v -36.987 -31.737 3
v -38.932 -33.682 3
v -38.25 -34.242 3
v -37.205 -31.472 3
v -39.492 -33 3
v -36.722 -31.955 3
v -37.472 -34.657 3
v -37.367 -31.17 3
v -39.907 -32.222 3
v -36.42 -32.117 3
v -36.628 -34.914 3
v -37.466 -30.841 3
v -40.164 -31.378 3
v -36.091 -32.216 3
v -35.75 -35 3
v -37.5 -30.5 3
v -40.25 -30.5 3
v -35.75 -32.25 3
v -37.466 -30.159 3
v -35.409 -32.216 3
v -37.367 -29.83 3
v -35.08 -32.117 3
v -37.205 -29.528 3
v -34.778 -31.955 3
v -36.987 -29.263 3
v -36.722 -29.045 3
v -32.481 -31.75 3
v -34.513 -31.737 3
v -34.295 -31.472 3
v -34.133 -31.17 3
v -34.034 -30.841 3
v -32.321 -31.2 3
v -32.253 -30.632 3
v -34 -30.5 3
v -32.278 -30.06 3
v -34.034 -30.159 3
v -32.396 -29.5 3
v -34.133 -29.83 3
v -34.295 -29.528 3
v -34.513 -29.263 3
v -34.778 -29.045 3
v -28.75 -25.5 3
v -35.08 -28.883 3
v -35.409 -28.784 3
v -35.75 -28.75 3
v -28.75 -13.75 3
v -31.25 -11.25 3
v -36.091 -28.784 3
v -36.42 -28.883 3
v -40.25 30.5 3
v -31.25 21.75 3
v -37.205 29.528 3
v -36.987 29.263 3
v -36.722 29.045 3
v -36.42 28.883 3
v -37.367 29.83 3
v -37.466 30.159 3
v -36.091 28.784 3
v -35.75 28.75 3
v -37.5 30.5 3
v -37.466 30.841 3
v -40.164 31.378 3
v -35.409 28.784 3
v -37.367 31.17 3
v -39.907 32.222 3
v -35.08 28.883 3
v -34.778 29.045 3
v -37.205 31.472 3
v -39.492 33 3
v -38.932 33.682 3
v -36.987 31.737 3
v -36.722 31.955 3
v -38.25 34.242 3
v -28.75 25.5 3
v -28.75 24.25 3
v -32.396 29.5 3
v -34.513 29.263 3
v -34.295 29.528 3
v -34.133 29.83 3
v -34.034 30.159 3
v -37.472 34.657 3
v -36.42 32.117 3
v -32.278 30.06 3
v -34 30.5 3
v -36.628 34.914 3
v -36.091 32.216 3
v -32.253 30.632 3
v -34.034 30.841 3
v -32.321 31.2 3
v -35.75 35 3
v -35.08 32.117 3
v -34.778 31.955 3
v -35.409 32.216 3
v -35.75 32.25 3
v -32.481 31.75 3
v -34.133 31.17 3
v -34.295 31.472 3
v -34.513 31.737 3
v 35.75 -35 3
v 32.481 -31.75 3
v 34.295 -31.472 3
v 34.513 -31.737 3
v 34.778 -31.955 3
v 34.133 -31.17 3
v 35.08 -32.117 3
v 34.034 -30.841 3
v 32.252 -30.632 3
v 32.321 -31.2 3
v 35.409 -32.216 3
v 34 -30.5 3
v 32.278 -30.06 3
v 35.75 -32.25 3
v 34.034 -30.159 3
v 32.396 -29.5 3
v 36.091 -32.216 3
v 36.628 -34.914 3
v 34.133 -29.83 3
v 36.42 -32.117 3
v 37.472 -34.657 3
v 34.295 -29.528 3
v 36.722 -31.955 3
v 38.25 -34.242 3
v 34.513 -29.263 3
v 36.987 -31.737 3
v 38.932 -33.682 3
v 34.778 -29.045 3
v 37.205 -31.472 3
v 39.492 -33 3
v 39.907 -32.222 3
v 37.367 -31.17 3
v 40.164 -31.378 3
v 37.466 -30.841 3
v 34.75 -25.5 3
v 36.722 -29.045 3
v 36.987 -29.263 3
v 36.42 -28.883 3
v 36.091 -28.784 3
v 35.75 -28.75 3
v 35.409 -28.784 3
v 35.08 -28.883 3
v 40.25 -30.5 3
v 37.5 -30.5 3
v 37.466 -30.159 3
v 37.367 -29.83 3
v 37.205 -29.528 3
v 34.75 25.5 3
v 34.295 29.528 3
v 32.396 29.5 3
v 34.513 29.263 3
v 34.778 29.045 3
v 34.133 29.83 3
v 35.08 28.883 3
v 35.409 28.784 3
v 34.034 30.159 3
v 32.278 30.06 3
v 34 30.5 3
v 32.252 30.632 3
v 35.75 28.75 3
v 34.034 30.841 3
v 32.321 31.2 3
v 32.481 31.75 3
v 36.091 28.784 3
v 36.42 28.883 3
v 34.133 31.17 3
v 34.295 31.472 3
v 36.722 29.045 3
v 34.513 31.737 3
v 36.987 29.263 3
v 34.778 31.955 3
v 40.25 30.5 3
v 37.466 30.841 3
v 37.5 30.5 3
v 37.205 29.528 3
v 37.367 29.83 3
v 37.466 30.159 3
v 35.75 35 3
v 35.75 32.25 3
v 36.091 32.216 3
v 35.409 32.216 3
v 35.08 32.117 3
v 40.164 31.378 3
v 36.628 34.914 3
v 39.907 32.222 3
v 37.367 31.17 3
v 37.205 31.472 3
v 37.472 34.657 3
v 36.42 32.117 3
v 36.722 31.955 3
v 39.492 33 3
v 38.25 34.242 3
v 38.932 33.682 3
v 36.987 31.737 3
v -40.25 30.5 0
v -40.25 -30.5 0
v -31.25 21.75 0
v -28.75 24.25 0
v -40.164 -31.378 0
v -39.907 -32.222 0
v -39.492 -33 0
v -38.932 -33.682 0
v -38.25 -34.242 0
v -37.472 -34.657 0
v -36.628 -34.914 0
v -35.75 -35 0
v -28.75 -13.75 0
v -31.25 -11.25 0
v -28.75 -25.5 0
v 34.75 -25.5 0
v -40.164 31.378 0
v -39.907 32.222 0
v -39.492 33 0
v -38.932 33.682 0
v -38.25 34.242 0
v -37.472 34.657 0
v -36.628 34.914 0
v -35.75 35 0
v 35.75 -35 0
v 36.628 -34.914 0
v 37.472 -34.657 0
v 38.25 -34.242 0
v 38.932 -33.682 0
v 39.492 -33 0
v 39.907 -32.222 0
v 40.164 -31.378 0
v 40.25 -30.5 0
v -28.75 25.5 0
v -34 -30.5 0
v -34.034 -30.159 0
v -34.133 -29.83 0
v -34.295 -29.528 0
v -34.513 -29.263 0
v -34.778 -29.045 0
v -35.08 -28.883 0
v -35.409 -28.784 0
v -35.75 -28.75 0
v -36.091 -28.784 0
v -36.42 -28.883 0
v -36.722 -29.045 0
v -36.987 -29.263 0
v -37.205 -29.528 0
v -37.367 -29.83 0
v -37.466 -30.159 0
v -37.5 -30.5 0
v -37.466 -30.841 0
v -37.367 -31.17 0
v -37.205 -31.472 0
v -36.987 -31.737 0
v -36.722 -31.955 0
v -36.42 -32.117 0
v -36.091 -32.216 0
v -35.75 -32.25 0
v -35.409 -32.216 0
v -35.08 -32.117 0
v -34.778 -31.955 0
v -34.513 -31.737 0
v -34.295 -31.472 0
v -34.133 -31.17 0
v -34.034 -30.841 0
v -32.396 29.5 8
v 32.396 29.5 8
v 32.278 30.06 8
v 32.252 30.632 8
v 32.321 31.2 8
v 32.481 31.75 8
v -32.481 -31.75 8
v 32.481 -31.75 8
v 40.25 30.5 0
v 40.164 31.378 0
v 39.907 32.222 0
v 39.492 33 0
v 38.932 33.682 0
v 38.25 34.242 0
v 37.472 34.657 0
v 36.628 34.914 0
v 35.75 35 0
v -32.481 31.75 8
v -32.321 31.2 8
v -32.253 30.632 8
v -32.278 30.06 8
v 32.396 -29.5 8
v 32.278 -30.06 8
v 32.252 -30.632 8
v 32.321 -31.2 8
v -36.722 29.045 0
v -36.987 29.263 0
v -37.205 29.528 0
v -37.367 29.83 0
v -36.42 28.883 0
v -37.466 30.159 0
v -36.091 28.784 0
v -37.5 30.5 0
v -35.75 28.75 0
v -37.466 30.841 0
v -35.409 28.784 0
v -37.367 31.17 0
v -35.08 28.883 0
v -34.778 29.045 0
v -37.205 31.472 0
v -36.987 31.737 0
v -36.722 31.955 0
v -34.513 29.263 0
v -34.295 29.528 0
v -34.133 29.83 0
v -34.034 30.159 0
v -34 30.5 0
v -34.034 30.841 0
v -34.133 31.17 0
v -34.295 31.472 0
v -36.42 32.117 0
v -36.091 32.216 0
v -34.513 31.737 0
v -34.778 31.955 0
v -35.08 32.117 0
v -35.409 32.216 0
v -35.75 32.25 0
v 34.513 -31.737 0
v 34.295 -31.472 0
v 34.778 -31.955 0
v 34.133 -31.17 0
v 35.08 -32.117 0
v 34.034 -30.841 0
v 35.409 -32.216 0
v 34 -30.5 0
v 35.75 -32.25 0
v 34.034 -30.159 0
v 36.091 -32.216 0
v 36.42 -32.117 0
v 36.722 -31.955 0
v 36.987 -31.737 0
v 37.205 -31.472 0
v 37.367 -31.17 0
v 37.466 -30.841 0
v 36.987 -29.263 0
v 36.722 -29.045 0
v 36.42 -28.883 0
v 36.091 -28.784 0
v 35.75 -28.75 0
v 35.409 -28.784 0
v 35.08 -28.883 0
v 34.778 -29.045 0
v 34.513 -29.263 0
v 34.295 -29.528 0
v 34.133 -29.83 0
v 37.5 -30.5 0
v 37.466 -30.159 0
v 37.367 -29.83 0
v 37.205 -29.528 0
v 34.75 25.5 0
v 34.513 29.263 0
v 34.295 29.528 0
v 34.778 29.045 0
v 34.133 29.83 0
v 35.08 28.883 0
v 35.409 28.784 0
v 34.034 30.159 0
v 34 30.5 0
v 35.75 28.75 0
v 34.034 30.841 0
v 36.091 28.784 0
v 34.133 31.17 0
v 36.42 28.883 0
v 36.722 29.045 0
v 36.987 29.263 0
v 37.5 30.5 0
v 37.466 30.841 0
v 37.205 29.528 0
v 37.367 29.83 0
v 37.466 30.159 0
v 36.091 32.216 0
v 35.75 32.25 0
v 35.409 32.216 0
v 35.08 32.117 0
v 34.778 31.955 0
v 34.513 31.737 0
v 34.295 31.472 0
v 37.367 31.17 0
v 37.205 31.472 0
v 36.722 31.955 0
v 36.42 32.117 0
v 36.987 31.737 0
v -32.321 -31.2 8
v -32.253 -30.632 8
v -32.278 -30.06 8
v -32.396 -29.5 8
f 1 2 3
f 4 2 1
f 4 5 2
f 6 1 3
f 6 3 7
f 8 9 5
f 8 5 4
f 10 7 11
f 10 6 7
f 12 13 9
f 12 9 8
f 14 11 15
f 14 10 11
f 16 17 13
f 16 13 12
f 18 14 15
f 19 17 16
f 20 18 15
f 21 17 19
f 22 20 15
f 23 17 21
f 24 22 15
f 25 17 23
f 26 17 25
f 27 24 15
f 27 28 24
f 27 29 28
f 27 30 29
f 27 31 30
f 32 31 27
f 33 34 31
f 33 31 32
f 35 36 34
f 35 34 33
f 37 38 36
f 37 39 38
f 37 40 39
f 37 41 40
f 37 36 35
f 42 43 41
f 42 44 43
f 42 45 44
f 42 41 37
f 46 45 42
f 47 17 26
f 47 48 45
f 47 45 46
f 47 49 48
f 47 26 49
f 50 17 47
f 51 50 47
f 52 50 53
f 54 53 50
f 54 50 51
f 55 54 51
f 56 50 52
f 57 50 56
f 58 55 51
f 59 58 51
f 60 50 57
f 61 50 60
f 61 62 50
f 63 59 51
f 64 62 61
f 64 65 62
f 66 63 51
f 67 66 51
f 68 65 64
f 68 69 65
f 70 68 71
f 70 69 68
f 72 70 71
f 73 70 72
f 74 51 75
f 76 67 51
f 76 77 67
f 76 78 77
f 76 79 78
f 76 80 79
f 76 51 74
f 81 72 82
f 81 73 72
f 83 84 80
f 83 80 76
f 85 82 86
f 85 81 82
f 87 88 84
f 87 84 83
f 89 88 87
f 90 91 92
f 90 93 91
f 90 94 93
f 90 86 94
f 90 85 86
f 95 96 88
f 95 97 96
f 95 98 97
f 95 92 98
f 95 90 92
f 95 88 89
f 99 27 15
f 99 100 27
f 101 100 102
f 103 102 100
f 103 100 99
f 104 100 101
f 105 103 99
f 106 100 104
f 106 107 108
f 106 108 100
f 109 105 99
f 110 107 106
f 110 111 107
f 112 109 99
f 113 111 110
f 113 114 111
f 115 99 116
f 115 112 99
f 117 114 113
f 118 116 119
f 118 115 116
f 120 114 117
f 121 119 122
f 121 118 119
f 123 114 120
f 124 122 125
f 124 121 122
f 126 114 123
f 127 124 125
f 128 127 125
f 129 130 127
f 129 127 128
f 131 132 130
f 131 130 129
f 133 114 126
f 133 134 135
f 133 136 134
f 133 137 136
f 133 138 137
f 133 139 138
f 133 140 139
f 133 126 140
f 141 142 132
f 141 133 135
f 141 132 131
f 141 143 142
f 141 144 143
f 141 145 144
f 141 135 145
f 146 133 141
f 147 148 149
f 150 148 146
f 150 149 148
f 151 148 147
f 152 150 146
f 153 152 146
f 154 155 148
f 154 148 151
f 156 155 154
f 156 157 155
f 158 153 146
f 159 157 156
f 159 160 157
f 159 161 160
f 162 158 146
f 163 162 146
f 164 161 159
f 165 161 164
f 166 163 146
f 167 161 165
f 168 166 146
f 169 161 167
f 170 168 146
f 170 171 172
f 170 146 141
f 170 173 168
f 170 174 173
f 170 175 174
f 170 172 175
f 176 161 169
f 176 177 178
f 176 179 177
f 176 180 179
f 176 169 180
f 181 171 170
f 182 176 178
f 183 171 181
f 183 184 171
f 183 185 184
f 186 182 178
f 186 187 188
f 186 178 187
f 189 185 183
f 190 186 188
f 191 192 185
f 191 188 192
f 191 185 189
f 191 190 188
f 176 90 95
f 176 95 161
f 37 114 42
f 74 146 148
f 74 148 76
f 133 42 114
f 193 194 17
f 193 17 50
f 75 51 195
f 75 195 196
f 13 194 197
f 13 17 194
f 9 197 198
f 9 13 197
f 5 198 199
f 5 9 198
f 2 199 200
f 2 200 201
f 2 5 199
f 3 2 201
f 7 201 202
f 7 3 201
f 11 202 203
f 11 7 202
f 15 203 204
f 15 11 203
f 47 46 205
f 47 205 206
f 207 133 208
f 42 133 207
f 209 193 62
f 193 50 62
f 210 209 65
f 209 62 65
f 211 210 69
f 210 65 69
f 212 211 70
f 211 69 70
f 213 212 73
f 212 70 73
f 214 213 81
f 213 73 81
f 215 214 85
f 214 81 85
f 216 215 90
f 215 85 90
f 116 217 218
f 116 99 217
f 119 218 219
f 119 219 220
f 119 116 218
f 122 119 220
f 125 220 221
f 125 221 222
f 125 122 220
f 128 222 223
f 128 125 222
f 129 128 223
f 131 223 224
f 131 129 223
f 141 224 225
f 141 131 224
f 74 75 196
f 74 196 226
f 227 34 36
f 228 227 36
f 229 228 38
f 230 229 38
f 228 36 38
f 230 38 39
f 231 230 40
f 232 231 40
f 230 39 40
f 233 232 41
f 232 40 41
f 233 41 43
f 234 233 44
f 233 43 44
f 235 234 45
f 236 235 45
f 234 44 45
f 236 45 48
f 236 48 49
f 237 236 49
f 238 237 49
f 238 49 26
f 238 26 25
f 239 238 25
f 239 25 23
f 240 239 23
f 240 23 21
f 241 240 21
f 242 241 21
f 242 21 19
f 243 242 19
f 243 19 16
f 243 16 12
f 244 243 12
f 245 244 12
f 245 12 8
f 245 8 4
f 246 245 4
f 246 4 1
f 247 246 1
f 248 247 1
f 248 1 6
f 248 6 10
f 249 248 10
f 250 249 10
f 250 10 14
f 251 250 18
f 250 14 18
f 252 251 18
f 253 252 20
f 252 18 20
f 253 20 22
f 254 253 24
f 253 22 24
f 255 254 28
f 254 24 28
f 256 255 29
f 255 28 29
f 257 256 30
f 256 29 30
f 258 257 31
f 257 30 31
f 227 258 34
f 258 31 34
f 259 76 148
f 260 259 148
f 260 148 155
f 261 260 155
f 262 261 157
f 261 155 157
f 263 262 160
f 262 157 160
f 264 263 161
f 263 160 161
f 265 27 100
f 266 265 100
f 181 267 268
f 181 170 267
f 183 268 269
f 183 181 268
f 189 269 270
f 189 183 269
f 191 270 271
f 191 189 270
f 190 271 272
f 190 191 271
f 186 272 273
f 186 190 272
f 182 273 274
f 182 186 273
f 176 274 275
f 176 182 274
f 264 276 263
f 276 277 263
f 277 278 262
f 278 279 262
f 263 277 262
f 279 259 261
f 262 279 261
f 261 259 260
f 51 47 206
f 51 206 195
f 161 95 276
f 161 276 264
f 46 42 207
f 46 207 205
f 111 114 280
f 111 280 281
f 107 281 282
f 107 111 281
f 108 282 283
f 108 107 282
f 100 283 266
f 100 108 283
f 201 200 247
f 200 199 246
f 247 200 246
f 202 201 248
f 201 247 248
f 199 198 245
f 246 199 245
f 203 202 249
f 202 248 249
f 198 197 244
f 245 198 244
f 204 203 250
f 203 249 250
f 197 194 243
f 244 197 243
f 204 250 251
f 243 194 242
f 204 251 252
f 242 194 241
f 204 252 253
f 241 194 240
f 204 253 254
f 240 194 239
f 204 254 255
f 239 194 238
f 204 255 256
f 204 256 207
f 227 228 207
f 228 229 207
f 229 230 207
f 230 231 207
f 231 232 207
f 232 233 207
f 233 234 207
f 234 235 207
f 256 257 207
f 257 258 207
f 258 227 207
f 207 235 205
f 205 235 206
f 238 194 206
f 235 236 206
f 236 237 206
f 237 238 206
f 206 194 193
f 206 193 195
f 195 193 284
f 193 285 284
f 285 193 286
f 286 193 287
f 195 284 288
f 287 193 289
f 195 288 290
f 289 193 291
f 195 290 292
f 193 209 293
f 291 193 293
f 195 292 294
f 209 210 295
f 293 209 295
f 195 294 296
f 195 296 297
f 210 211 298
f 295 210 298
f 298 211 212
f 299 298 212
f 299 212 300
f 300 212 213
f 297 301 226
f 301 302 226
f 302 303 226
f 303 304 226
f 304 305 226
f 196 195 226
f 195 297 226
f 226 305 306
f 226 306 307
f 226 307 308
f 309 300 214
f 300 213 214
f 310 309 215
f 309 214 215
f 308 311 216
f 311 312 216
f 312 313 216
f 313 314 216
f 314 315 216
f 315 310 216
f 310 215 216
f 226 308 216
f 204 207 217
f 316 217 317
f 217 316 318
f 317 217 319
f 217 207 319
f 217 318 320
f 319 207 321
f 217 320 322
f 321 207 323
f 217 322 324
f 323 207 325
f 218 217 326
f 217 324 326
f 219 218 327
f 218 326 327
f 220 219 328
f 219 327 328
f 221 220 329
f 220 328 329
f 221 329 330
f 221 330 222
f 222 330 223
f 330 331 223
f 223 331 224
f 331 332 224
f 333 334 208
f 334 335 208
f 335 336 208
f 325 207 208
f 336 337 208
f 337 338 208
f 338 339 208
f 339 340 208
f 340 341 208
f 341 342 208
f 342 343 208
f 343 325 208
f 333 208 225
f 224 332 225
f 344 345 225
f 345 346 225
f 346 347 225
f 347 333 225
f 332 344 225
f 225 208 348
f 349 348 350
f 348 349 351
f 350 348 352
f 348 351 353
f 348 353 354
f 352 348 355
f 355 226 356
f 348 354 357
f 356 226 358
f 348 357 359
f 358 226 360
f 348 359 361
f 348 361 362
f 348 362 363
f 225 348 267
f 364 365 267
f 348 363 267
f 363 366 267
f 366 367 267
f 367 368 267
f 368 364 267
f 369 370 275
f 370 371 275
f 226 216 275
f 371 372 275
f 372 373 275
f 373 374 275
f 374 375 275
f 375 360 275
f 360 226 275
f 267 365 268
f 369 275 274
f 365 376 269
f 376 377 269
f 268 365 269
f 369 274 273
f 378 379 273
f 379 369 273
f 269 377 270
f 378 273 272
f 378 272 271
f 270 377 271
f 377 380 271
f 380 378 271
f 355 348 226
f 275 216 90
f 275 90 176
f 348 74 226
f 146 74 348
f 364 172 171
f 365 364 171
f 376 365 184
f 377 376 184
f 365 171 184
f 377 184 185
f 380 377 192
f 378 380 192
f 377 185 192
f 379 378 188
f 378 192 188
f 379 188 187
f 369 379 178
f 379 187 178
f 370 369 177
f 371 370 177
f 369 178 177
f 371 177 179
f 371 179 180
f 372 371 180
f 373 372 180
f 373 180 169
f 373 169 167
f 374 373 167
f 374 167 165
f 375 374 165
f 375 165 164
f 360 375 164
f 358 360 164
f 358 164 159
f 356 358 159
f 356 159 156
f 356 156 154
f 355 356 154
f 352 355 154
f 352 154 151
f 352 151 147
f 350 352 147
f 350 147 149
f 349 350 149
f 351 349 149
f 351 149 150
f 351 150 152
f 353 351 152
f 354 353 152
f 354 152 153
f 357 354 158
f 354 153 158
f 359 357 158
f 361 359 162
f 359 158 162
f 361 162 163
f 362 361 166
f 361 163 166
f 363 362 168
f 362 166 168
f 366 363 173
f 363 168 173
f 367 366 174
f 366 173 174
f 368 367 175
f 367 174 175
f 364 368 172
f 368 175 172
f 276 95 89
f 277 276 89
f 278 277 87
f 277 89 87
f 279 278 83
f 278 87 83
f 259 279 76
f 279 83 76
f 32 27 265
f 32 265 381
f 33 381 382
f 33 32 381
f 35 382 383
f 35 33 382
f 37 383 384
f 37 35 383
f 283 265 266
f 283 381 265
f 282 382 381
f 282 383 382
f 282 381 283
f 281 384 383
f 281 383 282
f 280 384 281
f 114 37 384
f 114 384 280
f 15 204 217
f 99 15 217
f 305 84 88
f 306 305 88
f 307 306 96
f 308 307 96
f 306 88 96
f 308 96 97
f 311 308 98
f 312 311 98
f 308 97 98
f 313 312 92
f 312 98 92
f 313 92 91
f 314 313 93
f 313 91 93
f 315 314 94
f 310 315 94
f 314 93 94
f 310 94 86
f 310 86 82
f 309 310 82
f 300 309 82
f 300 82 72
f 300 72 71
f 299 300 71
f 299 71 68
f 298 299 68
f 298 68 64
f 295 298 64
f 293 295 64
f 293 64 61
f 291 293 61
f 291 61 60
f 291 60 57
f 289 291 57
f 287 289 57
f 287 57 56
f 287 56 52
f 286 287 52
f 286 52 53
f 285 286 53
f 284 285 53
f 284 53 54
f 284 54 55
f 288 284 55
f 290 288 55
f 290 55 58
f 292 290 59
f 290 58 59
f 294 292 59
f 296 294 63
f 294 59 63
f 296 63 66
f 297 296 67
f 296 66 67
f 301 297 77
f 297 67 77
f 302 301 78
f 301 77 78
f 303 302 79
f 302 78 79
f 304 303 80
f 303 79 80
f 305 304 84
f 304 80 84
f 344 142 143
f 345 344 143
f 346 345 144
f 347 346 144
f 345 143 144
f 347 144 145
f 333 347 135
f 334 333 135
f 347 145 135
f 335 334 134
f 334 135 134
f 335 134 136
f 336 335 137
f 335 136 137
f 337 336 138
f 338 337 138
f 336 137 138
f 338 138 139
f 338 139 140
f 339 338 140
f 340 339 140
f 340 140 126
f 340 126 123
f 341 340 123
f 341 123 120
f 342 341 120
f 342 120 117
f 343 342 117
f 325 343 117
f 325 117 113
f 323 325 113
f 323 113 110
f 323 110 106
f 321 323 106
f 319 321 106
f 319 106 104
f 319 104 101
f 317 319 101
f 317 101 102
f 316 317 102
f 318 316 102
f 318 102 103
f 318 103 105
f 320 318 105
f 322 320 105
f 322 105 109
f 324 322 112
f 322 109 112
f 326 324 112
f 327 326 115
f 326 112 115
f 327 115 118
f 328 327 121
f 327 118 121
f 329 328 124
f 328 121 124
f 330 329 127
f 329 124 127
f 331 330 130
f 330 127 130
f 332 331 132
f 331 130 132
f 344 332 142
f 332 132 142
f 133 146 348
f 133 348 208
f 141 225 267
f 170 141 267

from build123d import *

# Parameters (mm, degrees)
SKETCH_W        = 80.5
SKETCH_H        = 70
PAD_DEPTH       = 3
FILLET_R        = 4.5
SKETCH001_R     = 1.75
POCKET_DEPTH    = 3.001
PAD001_DEPTH    = 5
POCKET001_DEPTH = 3.001


with BuildPart() as part:
    # Sketch → Pad (new body)
    with BuildSketch(Plane.XY):
        Rectangle(SKETCH_W, SKETCH_H)
    extrude(amount=PAD_DEPTH)

    # Fillet
    fillet_edges = [part.edges().sort_by_distance(p)[0] for p in [
        (-40.25, -35, 1.5),
        (40.25, -35, 1.5),
        (40.25, 35, 1.5),
        (-40.25, 35, 1.5),
    ]]
    fillet(fillet_edges, radius=FILLET_R)

    # Sketch001 (on Face5 of Fillet) → Pocket (cut, through all)
    with BuildSketch(Plane.XY.offset(3)):
        with Locations((-35.75, 30.5)):
            Circle(SKETCH001_R)
        with Locations((35.75, 30.5)):
            Circle(SKETCH001_R)
        with Locations((-35.75, -30.5)):
            Circle(SKETCH001_R)
        with Locations((35.75, -30.5)):
            Circle(SKETCH001_R)
    extrude(amount=-POCKET_DEPTH, mode=Mode.SUBTRACT)

    # Sketch002 (on Face5 of Pocket) → Pad001 (join)
    with BuildSketch(Plane.XY.offset(3)):
        with BuildLine():
            Line((-32.480826, -31.75), (32.480826, -31.75))
            ThreePointArc((32.395898, -29.5), (32.252491, -30.632016), (32.480826, -31.75))
            Line((-32.395898, -29.5), (32.395898, -29.5))
            ThreePointArc((-32.480826, -31.75), (-32.253104, -30.631993), (-32.395898, -29.5))
        make_face()
    pad001 = extrude(amount=PAD001_DEPTH)

    # Mirrored: Pad001 across XZ
    add(pad001.mirror(Plane.XZ))

    # Sketch003 (on Face5 of Mirrored) → Pocket001 (cut, through all)
    with BuildSketch(Plane.XY.offset(3)):
        Polygon((34.75, 25.5), (34.75, -25.5), (-28.75, -25.5), (-28.75, -13.75), (-31.25, -11.25), (-31.25, 21.75), (-28.75, 24.25), (-28.75, 25.5), align=None)
    extrude(amount=-POCKET001_DEPTH, mode=Mode.SUBTRACT)


solid = part.part
